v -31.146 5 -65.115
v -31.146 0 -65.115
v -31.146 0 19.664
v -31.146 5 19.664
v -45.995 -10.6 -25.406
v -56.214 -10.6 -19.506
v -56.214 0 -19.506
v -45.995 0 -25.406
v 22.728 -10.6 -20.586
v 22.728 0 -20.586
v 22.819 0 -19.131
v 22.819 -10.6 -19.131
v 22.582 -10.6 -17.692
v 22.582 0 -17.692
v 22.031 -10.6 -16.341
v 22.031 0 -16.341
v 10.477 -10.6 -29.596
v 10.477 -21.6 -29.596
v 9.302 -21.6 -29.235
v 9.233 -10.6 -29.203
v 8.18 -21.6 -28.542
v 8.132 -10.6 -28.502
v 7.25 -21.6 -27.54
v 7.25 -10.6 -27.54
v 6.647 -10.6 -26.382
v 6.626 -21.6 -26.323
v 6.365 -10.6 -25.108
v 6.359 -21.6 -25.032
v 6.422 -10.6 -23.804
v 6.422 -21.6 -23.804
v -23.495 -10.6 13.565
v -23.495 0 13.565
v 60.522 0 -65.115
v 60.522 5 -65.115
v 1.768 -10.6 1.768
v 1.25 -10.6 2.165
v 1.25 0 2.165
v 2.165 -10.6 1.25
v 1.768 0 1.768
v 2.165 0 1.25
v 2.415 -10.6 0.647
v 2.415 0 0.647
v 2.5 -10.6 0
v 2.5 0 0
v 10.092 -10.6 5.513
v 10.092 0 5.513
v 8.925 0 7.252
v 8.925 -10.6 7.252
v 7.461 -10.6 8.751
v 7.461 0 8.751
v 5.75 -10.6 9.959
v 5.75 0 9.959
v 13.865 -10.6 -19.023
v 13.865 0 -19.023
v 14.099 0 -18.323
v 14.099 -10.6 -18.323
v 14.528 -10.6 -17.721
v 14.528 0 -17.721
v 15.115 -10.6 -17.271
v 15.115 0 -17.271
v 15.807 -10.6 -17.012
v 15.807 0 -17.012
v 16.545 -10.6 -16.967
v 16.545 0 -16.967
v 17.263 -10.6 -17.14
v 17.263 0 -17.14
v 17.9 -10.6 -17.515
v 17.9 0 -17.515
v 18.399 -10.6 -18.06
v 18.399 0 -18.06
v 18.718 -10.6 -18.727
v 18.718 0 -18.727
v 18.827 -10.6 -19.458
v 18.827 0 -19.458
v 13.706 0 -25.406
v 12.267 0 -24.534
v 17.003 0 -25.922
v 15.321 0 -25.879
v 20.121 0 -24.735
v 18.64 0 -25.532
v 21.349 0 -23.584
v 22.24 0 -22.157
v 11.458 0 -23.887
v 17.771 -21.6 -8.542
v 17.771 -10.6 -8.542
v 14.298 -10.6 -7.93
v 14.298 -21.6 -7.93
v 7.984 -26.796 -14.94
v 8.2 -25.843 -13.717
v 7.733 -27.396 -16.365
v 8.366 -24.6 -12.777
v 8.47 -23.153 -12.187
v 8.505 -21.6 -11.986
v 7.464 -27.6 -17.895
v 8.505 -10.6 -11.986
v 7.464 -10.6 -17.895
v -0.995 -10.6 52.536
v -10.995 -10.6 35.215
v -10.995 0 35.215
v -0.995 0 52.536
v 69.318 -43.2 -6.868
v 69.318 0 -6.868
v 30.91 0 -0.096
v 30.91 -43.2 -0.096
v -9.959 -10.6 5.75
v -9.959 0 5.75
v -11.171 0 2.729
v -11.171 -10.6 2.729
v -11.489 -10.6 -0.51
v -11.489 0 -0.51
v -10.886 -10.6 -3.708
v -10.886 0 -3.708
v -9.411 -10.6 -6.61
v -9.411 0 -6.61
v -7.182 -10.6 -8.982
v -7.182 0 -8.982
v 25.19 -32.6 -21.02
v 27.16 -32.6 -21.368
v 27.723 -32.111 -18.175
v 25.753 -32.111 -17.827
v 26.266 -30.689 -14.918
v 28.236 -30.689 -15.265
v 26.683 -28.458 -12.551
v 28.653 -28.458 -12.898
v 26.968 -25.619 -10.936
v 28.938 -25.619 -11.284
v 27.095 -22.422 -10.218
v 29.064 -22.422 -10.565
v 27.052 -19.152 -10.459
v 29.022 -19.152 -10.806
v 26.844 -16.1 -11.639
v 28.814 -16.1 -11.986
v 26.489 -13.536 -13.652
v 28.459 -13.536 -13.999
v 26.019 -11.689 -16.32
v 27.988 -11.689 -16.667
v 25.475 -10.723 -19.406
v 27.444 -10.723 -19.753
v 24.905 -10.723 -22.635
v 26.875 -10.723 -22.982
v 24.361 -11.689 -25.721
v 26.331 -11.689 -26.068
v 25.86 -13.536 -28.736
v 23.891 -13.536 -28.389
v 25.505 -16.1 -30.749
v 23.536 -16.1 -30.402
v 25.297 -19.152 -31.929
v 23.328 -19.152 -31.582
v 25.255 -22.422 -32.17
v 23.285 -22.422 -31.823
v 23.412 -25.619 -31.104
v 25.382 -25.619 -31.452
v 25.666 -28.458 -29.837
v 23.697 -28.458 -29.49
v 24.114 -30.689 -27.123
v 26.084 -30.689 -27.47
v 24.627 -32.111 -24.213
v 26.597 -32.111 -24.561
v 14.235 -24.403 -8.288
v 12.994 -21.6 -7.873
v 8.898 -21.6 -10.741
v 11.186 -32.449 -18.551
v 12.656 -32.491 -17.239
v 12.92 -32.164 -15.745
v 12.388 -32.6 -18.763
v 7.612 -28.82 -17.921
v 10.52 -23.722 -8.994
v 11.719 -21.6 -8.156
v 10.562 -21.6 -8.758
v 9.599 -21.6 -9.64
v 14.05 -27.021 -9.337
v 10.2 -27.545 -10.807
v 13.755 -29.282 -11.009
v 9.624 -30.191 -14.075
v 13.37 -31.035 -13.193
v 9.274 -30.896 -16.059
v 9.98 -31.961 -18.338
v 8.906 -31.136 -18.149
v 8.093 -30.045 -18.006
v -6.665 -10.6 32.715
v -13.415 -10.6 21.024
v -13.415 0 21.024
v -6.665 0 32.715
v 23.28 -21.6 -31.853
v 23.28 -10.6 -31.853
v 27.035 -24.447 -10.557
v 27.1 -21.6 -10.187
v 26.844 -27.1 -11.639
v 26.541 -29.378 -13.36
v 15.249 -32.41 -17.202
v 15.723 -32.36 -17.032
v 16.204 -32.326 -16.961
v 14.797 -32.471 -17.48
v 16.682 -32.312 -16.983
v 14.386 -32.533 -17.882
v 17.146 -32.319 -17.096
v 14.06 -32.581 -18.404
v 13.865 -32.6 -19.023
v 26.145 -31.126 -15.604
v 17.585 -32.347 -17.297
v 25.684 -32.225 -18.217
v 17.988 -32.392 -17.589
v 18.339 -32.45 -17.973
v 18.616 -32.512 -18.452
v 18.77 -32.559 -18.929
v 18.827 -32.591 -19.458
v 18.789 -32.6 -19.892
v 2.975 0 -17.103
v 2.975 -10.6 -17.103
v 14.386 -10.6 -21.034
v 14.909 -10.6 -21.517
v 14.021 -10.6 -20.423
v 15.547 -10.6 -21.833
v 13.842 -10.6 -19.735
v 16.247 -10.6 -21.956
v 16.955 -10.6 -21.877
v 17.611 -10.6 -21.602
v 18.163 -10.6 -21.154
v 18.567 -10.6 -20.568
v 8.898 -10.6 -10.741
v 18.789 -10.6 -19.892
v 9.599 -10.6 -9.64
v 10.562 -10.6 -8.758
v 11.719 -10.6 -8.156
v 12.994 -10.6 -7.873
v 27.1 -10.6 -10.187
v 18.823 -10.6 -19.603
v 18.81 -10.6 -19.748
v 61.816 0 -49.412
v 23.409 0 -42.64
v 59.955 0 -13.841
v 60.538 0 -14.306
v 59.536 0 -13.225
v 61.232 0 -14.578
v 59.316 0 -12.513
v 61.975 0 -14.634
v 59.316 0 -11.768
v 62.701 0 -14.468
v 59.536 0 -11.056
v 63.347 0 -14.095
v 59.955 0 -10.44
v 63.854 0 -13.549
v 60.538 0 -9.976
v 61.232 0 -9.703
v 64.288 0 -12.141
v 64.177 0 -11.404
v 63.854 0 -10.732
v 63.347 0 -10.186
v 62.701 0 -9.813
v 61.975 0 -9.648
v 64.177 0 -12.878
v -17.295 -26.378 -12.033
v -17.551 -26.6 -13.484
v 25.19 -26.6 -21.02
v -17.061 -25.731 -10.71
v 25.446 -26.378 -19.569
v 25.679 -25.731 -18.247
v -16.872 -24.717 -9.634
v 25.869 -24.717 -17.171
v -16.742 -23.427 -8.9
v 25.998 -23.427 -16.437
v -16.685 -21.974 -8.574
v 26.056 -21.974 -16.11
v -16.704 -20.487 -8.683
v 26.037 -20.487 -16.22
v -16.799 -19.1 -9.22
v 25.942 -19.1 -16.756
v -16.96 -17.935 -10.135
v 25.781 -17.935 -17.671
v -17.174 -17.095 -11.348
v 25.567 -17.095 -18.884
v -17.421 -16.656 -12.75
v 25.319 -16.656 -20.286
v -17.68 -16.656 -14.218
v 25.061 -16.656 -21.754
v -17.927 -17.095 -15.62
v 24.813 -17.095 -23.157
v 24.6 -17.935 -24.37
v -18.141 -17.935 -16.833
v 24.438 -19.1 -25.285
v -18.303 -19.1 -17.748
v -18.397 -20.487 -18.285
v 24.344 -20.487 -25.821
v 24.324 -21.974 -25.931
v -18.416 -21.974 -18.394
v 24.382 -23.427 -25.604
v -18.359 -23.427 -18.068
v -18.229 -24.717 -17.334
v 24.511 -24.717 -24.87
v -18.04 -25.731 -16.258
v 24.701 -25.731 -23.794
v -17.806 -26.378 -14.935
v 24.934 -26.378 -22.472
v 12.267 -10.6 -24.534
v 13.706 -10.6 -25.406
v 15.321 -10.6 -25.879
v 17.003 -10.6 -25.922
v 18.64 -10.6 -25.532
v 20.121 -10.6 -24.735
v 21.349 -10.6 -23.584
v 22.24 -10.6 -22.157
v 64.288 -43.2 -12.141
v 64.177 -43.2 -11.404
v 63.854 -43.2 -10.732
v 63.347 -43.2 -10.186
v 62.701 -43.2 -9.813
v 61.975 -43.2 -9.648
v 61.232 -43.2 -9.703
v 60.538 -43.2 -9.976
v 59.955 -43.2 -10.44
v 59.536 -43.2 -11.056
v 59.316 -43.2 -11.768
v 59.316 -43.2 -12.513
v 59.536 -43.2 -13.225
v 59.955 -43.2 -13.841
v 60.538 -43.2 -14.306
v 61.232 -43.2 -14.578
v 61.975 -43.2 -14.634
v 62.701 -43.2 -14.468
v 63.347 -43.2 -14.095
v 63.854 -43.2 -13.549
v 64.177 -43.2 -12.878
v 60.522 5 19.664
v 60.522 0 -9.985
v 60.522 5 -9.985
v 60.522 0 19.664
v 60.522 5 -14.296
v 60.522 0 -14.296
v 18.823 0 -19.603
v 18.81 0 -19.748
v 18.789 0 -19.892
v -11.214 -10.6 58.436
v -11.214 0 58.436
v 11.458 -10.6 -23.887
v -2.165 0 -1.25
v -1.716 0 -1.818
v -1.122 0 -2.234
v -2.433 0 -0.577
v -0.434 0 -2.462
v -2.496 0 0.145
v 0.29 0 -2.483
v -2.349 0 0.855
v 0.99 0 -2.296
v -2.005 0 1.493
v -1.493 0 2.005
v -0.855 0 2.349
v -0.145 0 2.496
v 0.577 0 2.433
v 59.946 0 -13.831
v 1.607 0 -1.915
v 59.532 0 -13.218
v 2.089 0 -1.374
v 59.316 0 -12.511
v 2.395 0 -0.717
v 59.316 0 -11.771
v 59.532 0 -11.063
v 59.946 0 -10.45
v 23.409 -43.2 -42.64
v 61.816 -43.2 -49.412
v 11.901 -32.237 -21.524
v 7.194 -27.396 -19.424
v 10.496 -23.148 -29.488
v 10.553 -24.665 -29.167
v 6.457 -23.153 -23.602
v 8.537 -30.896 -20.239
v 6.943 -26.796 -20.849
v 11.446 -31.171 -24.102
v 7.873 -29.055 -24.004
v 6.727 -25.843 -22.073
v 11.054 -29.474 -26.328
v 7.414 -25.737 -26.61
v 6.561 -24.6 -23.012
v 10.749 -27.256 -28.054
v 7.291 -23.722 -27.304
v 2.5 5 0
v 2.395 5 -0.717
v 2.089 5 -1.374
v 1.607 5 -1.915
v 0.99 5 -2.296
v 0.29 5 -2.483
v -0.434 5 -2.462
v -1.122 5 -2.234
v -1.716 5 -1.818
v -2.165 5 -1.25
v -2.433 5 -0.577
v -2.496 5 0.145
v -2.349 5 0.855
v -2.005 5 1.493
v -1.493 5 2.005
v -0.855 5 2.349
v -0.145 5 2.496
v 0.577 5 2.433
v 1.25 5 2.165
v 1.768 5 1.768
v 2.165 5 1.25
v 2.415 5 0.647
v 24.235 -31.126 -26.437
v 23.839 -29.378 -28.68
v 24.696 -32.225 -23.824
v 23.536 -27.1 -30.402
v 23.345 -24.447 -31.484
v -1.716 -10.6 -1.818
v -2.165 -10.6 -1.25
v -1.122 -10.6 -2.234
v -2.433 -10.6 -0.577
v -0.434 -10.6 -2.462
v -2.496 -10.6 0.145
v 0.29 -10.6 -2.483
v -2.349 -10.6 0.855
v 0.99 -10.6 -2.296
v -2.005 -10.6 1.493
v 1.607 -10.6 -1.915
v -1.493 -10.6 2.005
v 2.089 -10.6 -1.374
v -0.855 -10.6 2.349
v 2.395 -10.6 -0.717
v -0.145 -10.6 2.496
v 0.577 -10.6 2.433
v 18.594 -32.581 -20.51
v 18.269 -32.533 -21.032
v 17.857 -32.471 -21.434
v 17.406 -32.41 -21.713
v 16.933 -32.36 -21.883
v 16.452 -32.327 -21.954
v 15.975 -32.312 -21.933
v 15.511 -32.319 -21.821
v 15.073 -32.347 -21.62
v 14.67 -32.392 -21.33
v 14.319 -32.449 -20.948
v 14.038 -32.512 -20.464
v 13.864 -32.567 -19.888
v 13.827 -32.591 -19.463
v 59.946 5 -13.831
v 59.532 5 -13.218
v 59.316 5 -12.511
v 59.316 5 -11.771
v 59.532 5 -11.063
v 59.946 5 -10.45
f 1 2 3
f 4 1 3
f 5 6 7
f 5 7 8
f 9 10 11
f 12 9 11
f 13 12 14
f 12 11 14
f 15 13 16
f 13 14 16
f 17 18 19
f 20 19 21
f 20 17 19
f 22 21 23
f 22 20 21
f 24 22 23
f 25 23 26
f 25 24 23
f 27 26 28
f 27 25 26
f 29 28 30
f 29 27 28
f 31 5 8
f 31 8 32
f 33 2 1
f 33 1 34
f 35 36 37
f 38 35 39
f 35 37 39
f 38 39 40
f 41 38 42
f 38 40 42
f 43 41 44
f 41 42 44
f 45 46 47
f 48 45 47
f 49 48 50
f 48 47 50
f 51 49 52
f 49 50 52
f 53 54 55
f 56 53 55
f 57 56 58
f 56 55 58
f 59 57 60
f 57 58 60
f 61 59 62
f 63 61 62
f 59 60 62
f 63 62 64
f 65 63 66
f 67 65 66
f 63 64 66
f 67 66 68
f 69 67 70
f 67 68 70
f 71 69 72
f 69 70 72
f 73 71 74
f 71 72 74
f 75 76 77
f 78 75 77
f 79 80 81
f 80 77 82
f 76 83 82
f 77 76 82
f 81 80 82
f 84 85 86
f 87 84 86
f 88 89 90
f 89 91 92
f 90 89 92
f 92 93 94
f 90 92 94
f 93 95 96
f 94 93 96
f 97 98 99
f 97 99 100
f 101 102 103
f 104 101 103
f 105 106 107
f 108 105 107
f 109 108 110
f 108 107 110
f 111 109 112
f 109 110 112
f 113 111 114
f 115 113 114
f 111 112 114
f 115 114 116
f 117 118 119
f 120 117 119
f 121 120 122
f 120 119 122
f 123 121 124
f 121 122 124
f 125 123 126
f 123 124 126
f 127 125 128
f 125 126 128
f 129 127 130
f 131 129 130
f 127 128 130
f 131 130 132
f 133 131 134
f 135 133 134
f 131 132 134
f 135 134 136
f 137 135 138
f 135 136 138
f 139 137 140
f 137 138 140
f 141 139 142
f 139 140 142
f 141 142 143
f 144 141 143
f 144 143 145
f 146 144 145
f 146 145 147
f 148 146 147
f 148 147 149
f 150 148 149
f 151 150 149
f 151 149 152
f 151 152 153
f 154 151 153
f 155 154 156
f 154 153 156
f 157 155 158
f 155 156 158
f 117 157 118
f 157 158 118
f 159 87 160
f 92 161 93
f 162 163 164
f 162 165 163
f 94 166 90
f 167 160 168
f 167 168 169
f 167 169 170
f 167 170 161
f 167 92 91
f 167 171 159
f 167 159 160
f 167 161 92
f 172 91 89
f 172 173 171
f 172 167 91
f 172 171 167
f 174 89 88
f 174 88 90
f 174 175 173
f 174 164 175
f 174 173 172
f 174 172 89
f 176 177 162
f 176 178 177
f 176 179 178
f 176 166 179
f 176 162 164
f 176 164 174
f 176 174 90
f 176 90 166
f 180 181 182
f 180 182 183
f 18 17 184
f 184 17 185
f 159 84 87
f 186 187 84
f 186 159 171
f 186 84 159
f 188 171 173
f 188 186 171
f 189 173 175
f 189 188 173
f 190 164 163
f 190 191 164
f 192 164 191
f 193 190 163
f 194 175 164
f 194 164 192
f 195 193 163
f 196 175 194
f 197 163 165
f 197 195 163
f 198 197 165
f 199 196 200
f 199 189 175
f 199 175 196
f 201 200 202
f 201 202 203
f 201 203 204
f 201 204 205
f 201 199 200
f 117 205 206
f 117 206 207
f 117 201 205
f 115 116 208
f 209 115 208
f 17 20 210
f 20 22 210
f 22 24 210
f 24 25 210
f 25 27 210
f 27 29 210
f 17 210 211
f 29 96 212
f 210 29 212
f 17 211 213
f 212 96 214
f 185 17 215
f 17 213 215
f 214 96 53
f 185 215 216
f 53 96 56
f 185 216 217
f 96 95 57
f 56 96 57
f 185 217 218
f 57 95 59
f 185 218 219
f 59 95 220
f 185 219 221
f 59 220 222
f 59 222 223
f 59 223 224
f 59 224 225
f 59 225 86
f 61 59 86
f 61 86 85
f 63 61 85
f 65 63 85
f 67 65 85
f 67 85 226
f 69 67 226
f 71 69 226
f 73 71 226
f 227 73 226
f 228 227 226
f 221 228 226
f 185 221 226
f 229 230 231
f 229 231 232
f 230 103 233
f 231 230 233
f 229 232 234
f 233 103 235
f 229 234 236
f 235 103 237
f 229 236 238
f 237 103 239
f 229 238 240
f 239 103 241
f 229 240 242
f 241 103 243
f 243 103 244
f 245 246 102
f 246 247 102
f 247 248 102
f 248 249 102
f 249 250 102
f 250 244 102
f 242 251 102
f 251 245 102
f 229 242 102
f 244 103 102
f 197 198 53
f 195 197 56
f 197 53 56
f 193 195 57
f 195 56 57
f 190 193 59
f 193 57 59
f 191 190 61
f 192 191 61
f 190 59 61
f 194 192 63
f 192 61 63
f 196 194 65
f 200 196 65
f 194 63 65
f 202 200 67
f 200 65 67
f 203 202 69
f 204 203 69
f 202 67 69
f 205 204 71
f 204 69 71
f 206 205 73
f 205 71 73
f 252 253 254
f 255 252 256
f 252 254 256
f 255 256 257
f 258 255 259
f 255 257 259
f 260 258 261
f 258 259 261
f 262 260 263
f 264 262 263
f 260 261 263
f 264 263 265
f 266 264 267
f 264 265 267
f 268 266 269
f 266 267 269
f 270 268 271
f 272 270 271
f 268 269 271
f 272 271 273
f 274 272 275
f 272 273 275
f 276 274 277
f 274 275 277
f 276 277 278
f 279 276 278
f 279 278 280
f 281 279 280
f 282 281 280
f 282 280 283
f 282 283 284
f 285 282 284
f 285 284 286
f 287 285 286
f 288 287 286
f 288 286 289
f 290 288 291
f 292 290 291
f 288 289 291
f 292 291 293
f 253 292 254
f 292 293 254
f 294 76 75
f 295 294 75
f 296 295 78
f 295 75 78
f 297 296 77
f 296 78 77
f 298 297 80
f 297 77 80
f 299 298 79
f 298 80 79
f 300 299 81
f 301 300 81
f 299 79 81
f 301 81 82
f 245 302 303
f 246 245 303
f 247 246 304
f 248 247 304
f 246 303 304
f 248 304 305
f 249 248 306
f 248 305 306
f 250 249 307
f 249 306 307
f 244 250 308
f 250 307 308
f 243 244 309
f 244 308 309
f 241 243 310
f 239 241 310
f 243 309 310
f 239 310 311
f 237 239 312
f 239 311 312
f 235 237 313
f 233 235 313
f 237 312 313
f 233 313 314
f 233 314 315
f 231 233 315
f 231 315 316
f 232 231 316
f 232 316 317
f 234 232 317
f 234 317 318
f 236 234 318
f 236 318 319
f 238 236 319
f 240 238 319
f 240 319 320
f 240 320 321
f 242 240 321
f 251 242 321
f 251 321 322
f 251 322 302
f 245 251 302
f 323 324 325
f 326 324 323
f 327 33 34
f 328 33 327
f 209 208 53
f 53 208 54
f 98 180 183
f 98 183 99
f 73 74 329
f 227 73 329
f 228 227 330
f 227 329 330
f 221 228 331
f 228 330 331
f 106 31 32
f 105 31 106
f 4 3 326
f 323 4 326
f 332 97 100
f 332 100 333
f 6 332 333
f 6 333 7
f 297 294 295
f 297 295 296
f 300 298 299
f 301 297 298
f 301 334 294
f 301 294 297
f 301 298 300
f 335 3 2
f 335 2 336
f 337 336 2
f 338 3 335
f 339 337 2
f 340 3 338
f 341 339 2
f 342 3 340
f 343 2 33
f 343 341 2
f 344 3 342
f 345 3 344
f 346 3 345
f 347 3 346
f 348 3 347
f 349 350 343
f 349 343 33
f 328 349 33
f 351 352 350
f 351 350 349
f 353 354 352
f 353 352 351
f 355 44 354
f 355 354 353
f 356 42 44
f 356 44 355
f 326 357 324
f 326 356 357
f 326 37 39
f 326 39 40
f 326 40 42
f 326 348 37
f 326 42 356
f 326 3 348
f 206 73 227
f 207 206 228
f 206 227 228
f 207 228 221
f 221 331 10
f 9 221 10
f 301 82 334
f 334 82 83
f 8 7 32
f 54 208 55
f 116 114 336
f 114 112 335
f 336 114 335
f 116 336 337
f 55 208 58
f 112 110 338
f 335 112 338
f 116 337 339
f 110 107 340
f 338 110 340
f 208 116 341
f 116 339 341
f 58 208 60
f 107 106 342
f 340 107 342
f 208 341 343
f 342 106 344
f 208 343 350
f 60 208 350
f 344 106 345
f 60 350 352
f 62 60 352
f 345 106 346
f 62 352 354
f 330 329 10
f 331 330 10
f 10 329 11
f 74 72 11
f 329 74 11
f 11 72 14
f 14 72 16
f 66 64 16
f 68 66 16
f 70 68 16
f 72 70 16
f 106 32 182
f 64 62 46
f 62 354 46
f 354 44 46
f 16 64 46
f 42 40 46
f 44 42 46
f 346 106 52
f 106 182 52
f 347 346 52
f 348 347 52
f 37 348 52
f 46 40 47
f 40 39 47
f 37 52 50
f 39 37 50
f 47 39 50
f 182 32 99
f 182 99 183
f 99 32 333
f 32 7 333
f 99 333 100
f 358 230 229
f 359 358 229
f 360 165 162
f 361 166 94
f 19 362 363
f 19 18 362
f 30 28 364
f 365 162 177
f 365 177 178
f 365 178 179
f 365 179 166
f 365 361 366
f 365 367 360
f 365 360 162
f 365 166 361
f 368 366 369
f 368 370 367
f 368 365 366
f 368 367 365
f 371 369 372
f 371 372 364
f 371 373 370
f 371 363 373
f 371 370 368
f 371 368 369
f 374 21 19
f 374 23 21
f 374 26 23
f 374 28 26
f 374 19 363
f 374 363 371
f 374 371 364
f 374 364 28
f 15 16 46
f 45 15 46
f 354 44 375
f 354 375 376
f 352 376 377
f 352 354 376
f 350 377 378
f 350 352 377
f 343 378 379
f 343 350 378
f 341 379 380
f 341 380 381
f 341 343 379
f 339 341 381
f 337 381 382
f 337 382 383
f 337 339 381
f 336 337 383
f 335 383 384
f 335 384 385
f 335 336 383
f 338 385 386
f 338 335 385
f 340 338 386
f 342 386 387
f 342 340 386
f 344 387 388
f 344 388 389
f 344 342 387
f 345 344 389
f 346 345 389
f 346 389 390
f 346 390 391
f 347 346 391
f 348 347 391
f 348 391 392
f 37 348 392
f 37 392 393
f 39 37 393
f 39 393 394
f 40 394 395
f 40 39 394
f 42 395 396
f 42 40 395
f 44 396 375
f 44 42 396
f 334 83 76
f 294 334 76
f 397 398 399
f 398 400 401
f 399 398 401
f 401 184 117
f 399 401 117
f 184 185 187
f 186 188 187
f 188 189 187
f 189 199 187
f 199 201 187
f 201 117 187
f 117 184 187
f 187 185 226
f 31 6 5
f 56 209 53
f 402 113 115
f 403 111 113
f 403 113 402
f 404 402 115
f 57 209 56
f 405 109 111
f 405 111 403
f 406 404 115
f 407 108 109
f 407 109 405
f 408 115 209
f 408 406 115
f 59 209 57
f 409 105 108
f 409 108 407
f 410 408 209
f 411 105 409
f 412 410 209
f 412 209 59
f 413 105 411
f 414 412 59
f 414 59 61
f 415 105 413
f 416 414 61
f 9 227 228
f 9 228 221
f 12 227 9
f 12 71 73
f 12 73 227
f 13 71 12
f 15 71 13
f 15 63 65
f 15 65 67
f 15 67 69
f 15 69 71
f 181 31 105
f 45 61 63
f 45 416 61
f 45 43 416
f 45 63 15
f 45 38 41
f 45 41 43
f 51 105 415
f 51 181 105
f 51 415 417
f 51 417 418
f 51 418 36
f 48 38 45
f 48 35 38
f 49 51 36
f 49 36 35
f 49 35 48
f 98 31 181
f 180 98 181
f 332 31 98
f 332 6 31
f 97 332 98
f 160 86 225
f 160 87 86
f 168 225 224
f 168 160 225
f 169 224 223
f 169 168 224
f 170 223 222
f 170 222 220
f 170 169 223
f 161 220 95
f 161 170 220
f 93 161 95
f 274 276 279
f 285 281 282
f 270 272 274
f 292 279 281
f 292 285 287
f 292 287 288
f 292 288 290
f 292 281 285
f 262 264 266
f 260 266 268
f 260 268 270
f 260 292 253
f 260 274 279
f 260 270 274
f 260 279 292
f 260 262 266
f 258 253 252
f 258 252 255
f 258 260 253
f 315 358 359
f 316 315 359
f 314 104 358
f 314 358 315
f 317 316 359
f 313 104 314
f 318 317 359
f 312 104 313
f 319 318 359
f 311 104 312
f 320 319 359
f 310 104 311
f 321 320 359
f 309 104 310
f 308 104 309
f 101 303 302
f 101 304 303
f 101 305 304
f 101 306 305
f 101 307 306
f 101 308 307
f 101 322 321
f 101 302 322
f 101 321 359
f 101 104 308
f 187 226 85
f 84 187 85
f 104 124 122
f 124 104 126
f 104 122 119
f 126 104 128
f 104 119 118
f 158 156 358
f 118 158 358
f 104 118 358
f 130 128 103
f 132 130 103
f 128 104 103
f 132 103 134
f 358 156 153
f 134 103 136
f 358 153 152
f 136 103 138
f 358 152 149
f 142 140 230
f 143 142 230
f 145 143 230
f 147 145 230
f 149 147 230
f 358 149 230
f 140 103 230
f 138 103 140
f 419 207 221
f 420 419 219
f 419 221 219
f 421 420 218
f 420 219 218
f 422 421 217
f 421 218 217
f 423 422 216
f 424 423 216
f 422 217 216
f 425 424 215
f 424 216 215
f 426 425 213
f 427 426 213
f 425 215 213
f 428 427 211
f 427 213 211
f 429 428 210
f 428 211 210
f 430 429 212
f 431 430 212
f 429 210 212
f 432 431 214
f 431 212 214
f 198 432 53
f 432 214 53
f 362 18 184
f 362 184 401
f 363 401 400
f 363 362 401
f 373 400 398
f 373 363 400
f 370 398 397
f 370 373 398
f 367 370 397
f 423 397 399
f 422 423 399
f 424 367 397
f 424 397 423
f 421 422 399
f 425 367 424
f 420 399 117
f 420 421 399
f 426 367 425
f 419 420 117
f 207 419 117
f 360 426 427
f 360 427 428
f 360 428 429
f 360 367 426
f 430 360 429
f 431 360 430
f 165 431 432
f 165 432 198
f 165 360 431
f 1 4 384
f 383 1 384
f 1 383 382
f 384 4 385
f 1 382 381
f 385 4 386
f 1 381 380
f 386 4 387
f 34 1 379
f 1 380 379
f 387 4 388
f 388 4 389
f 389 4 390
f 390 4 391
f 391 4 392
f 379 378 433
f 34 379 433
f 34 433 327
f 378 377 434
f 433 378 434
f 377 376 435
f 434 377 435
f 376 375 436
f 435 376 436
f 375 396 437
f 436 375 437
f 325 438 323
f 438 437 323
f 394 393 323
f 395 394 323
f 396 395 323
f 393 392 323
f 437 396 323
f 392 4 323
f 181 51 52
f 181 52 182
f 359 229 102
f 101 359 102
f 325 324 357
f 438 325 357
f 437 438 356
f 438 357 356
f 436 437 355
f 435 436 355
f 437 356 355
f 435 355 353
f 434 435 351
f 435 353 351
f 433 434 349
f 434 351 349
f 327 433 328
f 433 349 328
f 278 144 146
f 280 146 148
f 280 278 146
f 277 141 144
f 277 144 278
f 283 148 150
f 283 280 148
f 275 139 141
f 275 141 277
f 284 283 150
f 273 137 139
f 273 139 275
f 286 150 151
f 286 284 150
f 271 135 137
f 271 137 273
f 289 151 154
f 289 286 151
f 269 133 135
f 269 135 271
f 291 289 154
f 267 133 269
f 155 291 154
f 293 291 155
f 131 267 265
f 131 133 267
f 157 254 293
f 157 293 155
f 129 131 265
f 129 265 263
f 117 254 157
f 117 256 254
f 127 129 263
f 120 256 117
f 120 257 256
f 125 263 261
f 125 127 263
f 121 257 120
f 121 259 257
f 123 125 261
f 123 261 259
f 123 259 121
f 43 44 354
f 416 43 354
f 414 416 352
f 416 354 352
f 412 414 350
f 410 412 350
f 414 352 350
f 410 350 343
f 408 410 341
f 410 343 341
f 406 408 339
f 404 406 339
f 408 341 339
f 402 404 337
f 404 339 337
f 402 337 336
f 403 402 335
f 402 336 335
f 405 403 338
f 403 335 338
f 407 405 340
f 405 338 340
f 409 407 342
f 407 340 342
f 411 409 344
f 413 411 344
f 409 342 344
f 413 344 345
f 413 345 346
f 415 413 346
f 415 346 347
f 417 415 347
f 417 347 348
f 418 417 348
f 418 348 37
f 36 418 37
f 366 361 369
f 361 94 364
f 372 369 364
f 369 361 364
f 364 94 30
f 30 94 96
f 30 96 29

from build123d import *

# Parameters (mm, degrees)
F1_DEPTH    = 10.6
F2_DEPTH    = 43.2
F3_R        = 11
F4_DEPTH    = 2
F5_R        = 5
F6_DEPTH    = 43.4
F8_DEPTH    = 22
F9_T1_DEPTH = 73
F9_T3_DEPTH = 73
F10_W       = 91.6676837951
F10_H       = 84.7782492638
F11_DEPTH   = 5
F12_R       = 2.5
F13_DEPTH   = 74.8
F15_DEPTH   = 10.6
F16_R       = 5


# Not quite as in the source:
# - a fillet or chamfer that OpenCascade refuses, or shapes differently, is made with other operations: its cross-section is extruded or revolved along the edge and cut away or added
# - a feature names something its author has since deleted; it is built from what else it names


with BuildPart() as f1:
    # F0 (on Front) → F1 (new body)
    with BuildSketch(Plane.XZ):
        with BuildLine():
            Line((22.031131561, -16.3413353843), (10.0922695634, 5.5132653717))
            ThreePointArc((10.0922695634, 5.5132653717), (8.2271601871, 8.0351624287), (5.75, 9.9592921435))
            ThreePointArc((5.75, 9.9592921435), (-9.4974624505, 6.4844588827), (-7.1820107007, -8.9815768268))
            Line((-7.1820107007, -8.9815768268), (2.9745766929, -17.1031707017))
            Line((2.9745766929, -17.1031707017), (13.8647859035, -19.0234084111))
            ThreePointArc((13.8647859035, -19.0234084111), (16.5446946429, -16.96704211), (18.826805286, -19.4575288552))
            ThreePointArc((18.826805286, -19.4575288552), (18.8172920313, -19.6754182121), (18.7888246686, -19.8916492994))
            Line((18.7888246686, -19.8916492994), (22.7280556806, -20.5862420101))
            ThreePointArc((22.7280556806, -20.5862420101), (22.7409345871, -18.4044641332), (22.031131561, -16.3413353843))
        make_face()
        with BuildLine():
            ThreePointArc((2.5, 0), (-2.1650635095, -1.25), (1.25, 2.1650635095))
            ThreePointArc((1.25, 2.1650635095), (2.1650635095, 1.25), (2.5, 0))
        make_face(mode=Mode.SUBTRACT)
    extrude(amount=F1_DEPTH)

    # F14 (on face) → F15 (join)
    with BuildSketch(Plane.XZ.offset(10.6)):
        with BuildLine():
            Line((-17.7446848749, 23.5239547806), (-23.4946848749, 13.564662637))
            Line((-23.4946848749, 13.564662637), (-9.9592921435, 5.75))
            ThreePointArc((-9.9592921435, 5.75), (-2.9764190187, 11.1081470023), (5.75, 9.9592921435))
            Line((5.75, 9.9592921435), (-13.414557856, 21.0239547806))
            Line((-13.414557856, 21.0239547806), (-6.664557856, 32.7152977317))
            Line((-6.664557856, 32.7152977317), (-10.9946848749, 35.2152977317))
            Line((-10.9946848749, 35.2152977317), (-17.7446848749, 23.5239547806))
        make_face()
        Polygon((-41.6238499995, -4.8359724576), (-35.9946848749, -8.0859724576), (-23.4946848749, 13.564662637), (-17.7446848749, 23.5239547806), (-10.9946848749, 35.2152977317), (-16.6238499995, 38.4652977317), align=None)
        Polygon((-45.9946848749, -25.4064805333), (-35.9946848749, -8.0859724576), (-41.6238499995, -4.8359724576), (-16.6238499995, 38.4652977317), (-10.9946848749, 35.2152977317), (-0.9946848749, 52.5358058073), (-11.2137846395, 58.4358058073), (-56.2137846395, -19.5064805333), align=None)
    extrude(amount=-F15_DEPTH)


with BuildPart() as f1b:
    # F0 (on Front) → F1, piece 2 (new body)
    with BuildSketch(Plane.XZ):
        with BuildLine():
            ThreePointArc((12.2674079335, -24.5340722791), (17.833993936, -25.7803749211), (22.2397717789, -22.1569412458))
            Line((22.2397717789, -22.1569412458), (11.4577686407, -23.8866538829))
            Line((11.4577686407, -23.8866538829), (12.2674079335, -24.5340722791))
        make_face()
    extrude(amount=F1_DEPTH)


with BuildPart() as f2:
    # F0 (on Front) → F2 (new body)
    with BuildSketch(Plane.XZ):
        Polygon((30.9104912068, -0.0958113445), (27.1596905692, -21.3676588096), (23.4088899316, -42.6395062746), (61.816392299, -49.4117852036), (69.3179935743, -6.8680902735), align=None)
    extrude(amount=F2_DEPTH)

    # F3 (on face) → F4 (join)
    with BuildSketch(Plane(origin=(29.9948105542, 0, -5.2888943819), x_dir=(0, -1, 0), z_dir=(-0.984807753, 0, 0.1736481777))):
        with Locations((21.6, -16.326805286)):
            Circle(F3_R)
    extrude(amount=F4_DEPTH)

    # F5 (on face) → F6 (join)
    with BuildSketch(Plane(origin=(28.0251950482, 0, -4.9415980266), x_dir=(0, -1, 0), z_dir=(-0.984807753, 0, 0.1736481777))):
        with Locations((21.6, -16.326805286)):
            Circle(F5_R)
    extrude(amount=F6_DEPTH)


with BuildPart() as f8:
    # F7 (on face) → F8 (new body)
    with BuildSketch(Plane.XZ.offset(10.6)):
        with BuildLine():
            ThreePointArc((18.7888246686, -19.8916492994), (15.8926848419, -21.9195482378), (13.8647859035, -19.0234084111))
            Line((13.8647859035, -19.0234084111), (7.4635355089, -17.8946952562))
            Line((7.4635355089, -17.8946952562), (5.5534055546, -28.7275805394))
            Line((5.5534055546, -28.7275805394), (23.2799451088, -31.8532477374))
            Line((23.2799451088, -31.8532477374), (27.1002050175, -10.1874771711))
            Line((27.1002050175, -10.1874771711), (17.7707010183, -8.5424338994))
            Line((17.7707010183, -8.5424338994), (22.031131561, -16.3413353843))
            ThreePointArc((22.031131561, -16.3413353843), (22.7409345871, -18.4044641332), (22.7280556806, -20.5862420101))
            Line((22.7280556806, -20.5862420101), (18.7888246686, -19.8916492994))
        make_face()
        with BuildLine():
            ThreePointArc((13.8647859035, -19.0234084111), (16.5446946429, -16.96704211), (18.826805286, -19.4575288552))
            ThreePointArc((18.826805286, -19.4575288552), (18.8172920313, -19.6754182121), (18.7888246686, -19.8916492994))
            Line((18.7888246686, -19.8916492994), (22.7280556806, -20.5862420101))
            ThreePointArc((22.7280556806, -20.5862420101), (22.7409345871, -18.4044641332), (22.031131561, -16.3413353843))
            Line((22.031131561, -16.3413353843), (17.7707010183, -8.5424338994))
            Line((17.7707010183, -8.5424338994), (9.3736654633, -7.0618099731))
            Line((9.3736654633, -7.0618099731), (7.4635355089, -17.8946952562))
            Line((7.4635355089, -17.8946952562), (13.8647859035, -19.0234084111))
        make_face()
    extrude(amount=F8_DEPTH)

    # F9: fillet of radius 11 on 2 edges, made by hand

    # F9_s2 → F9_t1 (cut)
    with BuildSketch(Plane(origin=(55.107408256, 0, -9.7169229125), x_dir=(0, 1, 0), z_dir=(-0.984807753, 0, 0.1736481777))):
        with BuildLine():
            ThreePointArc((-21.6, 5.326805286), (-29.3781745931, 8.548630693), (-32.6, 16.326805286))
            Line((-32.6, 16.326805286), (-32.6, 5.326805286))
            Line((-32.6, 5.326805286), (-21.6, 5.326805286))
        make_face()
    extrude(amount=F9_T1_DEPTH, mode=Mode.SUBTRACT)

    # F9_s4 → F9_t3 (cut)
    with BuildSketch(Plane(origin=(-16.7835577139, 0, 2.9593940572), x_dir=(0, 1, 0), z_dir=(0.984807753, 0, -0.1736481777))):
        with BuildLine():
            ThreePointArc((-21.6, -27.326805286), (-29.3781745931, -24.1049798791), (-32.6, -16.326805286))
            Line((-32.6, -16.326805286), (-32.6, -27.326805286))
            Line((-32.6, -27.326805286), (-21.6, -27.326805286))
        make_face()
    extrude(amount=F9_T3_DEPTH, mode=Mode.SUBTRACT)

    # F16
    f16_edges = [f8.edges().sort_by_distance(p)[0] for p in [
        (8.814201, -29.378175, -10.234689),
        (5.553406, -16.1, -28.727581),
        (6.11287, -29.378175, -25.554702),
        (9.373665, -16.1, -7.06181),
    ]]
    fillet(f16_edges, radius=F16_R)


with BuildPart() as f11:
    # F10 (on face) → F11 (new body)
    with BuildSketch(Plane.XZ):
        with Locations((14.6878799424, -22.7255448699)):
            Rectangle(F10_W, F10_H)
        with BuildLine():
            Line((10.0922695634, 5.5132653717), (22.031131561, -16.3413353843))
            ThreePointArc((22.031131561, -16.3413353843), (22.7409345871, -18.4044641332), (22.7280556806, -20.5862420101))
            Line((22.7280556806, -20.5862420101), (18.7888246686, -19.8916492994))
            ThreePointArc((18.7888246686, -19.8916492994), (18.8172920313, -19.6754182121), (18.826805286, -19.4575288552))
            ThreePointArc((18.826805286, -19.4575288552), (16.5446946429, -16.96704211), (13.8647859035, -19.0234084111))
            Line((13.8647859035, -19.0234084111), (2.9745766929, -17.1031707017))
            Line((2.9745766929, -17.1031707017), (-7.1820107007, -8.9815768268))
            ThreePointArc((-7.1820107007, -8.9815768268), (-9.4974624505, 6.4844588827), (5.75, 9.9592921435))
            ThreePointArc((5.75, 9.9592921435), (8.2271601871, 8.0351624287), (10.0922695634, 5.5132653717))
        make_face(mode=Mode.SUBTRACT)
    extrude(amount=-F11_DEPTH)

    # F0 (on Front) → F11, piece 2 (join)
    with BuildSketch(Plane.XZ):
        with BuildLine():
            Line((22.031131561, -16.3413353843), (10.0922695634, 5.5132653717))
            ThreePointArc((10.0922695634, 5.5132653717), (8.2271601871, 8.0351624287), (5.75, 9.9592921435))
            ThreePointArc((5.75, 9.9592921435), (-9.4974624505, 6.4844588827), (-7.1820107007, -8.9815768268))
            Line((-7.1820107007, -8.9815768268), (2.9745766929, -17.1031707017))
            Line((2.9745766929, -17.1031707017), (13.8647859035, -19.0234084111))
            ThreePointArc((13.8647859035, -19.0234084111), (16.5446946429, -16.96704211), (18.826805286, -19.4575288552))
            ThreePointArc((18.826805286, -19.4575288552), (18.8172920313, -19.6754182121), (18.7888246686, -19.8916492994))
            Line((18.7888246686, -19.8916492994), (22.7280556806, -20.5862420101))
            ThreePointArc((22.7280556806, -20.5862420101), (22.7409345871, -18.4044641332), (22.031131561, -16.3413353843))
        make_face()
        with BuildLine():
            ThreePointArc((2.5, 0), (-2.1650635095, -1.25), (1.25, 2.1650635095))
            ThreePointArc((1.25, 2.1650635095), (2.1650635095, 1.25), (2.5, 0))
        make_face(mode=Mode.SUBTRACT)
        with BuildLine():
            ThreePointArc((13.8647859035, -19.0234084111), (15.8926848419, -21.9195482378), (18.7888246686, -19.8916492994))
            Line((18.7888246686, -19.8916492994), (13.8647859035, -19.0234084111))
        make_face()
        with BuildLine():
            Line((13.8647859035, -19.0234084111), (18.7888246686, -19.8916492994))
            ThreePointArc((18.7888246686, -19.8916492994), (18.8172920313, -19.6754182121), (18.826805286, -19.4575288552))
            ThreePointArc((18.826805286, -19.4575288552), (16.5446946429, -16.96704211), (13.8647859035, -19.0234084111))
        make_face()
    extrude(amount=-F11_DEPTH)


with BuildPart() as f13_tool:
    # F12 (on face) → F13 (new body)
    with BuildSketch(Plane.XZ.offset(43.2)):
        with Locations((61.7880300248, -12.1406275132)):
            Circle(F12_R)
    extrude(amount=-F13_DEPTH)


with BuildPart() as f2_1:
    add(f2.part)

    # F13: cut by f13_tool
    add(f13_tool.part, mode=Mode.SUBTRACT)


with BuildPart() as f11_1:
    add(f11.part)

    # F13: cut by f13_tool
    add(f13_tool.part, mode=Mode.SUBTRACT)


solid = Compound([f1.part, f1b.part, f8.part, f2_1.part, f11_1.part])
